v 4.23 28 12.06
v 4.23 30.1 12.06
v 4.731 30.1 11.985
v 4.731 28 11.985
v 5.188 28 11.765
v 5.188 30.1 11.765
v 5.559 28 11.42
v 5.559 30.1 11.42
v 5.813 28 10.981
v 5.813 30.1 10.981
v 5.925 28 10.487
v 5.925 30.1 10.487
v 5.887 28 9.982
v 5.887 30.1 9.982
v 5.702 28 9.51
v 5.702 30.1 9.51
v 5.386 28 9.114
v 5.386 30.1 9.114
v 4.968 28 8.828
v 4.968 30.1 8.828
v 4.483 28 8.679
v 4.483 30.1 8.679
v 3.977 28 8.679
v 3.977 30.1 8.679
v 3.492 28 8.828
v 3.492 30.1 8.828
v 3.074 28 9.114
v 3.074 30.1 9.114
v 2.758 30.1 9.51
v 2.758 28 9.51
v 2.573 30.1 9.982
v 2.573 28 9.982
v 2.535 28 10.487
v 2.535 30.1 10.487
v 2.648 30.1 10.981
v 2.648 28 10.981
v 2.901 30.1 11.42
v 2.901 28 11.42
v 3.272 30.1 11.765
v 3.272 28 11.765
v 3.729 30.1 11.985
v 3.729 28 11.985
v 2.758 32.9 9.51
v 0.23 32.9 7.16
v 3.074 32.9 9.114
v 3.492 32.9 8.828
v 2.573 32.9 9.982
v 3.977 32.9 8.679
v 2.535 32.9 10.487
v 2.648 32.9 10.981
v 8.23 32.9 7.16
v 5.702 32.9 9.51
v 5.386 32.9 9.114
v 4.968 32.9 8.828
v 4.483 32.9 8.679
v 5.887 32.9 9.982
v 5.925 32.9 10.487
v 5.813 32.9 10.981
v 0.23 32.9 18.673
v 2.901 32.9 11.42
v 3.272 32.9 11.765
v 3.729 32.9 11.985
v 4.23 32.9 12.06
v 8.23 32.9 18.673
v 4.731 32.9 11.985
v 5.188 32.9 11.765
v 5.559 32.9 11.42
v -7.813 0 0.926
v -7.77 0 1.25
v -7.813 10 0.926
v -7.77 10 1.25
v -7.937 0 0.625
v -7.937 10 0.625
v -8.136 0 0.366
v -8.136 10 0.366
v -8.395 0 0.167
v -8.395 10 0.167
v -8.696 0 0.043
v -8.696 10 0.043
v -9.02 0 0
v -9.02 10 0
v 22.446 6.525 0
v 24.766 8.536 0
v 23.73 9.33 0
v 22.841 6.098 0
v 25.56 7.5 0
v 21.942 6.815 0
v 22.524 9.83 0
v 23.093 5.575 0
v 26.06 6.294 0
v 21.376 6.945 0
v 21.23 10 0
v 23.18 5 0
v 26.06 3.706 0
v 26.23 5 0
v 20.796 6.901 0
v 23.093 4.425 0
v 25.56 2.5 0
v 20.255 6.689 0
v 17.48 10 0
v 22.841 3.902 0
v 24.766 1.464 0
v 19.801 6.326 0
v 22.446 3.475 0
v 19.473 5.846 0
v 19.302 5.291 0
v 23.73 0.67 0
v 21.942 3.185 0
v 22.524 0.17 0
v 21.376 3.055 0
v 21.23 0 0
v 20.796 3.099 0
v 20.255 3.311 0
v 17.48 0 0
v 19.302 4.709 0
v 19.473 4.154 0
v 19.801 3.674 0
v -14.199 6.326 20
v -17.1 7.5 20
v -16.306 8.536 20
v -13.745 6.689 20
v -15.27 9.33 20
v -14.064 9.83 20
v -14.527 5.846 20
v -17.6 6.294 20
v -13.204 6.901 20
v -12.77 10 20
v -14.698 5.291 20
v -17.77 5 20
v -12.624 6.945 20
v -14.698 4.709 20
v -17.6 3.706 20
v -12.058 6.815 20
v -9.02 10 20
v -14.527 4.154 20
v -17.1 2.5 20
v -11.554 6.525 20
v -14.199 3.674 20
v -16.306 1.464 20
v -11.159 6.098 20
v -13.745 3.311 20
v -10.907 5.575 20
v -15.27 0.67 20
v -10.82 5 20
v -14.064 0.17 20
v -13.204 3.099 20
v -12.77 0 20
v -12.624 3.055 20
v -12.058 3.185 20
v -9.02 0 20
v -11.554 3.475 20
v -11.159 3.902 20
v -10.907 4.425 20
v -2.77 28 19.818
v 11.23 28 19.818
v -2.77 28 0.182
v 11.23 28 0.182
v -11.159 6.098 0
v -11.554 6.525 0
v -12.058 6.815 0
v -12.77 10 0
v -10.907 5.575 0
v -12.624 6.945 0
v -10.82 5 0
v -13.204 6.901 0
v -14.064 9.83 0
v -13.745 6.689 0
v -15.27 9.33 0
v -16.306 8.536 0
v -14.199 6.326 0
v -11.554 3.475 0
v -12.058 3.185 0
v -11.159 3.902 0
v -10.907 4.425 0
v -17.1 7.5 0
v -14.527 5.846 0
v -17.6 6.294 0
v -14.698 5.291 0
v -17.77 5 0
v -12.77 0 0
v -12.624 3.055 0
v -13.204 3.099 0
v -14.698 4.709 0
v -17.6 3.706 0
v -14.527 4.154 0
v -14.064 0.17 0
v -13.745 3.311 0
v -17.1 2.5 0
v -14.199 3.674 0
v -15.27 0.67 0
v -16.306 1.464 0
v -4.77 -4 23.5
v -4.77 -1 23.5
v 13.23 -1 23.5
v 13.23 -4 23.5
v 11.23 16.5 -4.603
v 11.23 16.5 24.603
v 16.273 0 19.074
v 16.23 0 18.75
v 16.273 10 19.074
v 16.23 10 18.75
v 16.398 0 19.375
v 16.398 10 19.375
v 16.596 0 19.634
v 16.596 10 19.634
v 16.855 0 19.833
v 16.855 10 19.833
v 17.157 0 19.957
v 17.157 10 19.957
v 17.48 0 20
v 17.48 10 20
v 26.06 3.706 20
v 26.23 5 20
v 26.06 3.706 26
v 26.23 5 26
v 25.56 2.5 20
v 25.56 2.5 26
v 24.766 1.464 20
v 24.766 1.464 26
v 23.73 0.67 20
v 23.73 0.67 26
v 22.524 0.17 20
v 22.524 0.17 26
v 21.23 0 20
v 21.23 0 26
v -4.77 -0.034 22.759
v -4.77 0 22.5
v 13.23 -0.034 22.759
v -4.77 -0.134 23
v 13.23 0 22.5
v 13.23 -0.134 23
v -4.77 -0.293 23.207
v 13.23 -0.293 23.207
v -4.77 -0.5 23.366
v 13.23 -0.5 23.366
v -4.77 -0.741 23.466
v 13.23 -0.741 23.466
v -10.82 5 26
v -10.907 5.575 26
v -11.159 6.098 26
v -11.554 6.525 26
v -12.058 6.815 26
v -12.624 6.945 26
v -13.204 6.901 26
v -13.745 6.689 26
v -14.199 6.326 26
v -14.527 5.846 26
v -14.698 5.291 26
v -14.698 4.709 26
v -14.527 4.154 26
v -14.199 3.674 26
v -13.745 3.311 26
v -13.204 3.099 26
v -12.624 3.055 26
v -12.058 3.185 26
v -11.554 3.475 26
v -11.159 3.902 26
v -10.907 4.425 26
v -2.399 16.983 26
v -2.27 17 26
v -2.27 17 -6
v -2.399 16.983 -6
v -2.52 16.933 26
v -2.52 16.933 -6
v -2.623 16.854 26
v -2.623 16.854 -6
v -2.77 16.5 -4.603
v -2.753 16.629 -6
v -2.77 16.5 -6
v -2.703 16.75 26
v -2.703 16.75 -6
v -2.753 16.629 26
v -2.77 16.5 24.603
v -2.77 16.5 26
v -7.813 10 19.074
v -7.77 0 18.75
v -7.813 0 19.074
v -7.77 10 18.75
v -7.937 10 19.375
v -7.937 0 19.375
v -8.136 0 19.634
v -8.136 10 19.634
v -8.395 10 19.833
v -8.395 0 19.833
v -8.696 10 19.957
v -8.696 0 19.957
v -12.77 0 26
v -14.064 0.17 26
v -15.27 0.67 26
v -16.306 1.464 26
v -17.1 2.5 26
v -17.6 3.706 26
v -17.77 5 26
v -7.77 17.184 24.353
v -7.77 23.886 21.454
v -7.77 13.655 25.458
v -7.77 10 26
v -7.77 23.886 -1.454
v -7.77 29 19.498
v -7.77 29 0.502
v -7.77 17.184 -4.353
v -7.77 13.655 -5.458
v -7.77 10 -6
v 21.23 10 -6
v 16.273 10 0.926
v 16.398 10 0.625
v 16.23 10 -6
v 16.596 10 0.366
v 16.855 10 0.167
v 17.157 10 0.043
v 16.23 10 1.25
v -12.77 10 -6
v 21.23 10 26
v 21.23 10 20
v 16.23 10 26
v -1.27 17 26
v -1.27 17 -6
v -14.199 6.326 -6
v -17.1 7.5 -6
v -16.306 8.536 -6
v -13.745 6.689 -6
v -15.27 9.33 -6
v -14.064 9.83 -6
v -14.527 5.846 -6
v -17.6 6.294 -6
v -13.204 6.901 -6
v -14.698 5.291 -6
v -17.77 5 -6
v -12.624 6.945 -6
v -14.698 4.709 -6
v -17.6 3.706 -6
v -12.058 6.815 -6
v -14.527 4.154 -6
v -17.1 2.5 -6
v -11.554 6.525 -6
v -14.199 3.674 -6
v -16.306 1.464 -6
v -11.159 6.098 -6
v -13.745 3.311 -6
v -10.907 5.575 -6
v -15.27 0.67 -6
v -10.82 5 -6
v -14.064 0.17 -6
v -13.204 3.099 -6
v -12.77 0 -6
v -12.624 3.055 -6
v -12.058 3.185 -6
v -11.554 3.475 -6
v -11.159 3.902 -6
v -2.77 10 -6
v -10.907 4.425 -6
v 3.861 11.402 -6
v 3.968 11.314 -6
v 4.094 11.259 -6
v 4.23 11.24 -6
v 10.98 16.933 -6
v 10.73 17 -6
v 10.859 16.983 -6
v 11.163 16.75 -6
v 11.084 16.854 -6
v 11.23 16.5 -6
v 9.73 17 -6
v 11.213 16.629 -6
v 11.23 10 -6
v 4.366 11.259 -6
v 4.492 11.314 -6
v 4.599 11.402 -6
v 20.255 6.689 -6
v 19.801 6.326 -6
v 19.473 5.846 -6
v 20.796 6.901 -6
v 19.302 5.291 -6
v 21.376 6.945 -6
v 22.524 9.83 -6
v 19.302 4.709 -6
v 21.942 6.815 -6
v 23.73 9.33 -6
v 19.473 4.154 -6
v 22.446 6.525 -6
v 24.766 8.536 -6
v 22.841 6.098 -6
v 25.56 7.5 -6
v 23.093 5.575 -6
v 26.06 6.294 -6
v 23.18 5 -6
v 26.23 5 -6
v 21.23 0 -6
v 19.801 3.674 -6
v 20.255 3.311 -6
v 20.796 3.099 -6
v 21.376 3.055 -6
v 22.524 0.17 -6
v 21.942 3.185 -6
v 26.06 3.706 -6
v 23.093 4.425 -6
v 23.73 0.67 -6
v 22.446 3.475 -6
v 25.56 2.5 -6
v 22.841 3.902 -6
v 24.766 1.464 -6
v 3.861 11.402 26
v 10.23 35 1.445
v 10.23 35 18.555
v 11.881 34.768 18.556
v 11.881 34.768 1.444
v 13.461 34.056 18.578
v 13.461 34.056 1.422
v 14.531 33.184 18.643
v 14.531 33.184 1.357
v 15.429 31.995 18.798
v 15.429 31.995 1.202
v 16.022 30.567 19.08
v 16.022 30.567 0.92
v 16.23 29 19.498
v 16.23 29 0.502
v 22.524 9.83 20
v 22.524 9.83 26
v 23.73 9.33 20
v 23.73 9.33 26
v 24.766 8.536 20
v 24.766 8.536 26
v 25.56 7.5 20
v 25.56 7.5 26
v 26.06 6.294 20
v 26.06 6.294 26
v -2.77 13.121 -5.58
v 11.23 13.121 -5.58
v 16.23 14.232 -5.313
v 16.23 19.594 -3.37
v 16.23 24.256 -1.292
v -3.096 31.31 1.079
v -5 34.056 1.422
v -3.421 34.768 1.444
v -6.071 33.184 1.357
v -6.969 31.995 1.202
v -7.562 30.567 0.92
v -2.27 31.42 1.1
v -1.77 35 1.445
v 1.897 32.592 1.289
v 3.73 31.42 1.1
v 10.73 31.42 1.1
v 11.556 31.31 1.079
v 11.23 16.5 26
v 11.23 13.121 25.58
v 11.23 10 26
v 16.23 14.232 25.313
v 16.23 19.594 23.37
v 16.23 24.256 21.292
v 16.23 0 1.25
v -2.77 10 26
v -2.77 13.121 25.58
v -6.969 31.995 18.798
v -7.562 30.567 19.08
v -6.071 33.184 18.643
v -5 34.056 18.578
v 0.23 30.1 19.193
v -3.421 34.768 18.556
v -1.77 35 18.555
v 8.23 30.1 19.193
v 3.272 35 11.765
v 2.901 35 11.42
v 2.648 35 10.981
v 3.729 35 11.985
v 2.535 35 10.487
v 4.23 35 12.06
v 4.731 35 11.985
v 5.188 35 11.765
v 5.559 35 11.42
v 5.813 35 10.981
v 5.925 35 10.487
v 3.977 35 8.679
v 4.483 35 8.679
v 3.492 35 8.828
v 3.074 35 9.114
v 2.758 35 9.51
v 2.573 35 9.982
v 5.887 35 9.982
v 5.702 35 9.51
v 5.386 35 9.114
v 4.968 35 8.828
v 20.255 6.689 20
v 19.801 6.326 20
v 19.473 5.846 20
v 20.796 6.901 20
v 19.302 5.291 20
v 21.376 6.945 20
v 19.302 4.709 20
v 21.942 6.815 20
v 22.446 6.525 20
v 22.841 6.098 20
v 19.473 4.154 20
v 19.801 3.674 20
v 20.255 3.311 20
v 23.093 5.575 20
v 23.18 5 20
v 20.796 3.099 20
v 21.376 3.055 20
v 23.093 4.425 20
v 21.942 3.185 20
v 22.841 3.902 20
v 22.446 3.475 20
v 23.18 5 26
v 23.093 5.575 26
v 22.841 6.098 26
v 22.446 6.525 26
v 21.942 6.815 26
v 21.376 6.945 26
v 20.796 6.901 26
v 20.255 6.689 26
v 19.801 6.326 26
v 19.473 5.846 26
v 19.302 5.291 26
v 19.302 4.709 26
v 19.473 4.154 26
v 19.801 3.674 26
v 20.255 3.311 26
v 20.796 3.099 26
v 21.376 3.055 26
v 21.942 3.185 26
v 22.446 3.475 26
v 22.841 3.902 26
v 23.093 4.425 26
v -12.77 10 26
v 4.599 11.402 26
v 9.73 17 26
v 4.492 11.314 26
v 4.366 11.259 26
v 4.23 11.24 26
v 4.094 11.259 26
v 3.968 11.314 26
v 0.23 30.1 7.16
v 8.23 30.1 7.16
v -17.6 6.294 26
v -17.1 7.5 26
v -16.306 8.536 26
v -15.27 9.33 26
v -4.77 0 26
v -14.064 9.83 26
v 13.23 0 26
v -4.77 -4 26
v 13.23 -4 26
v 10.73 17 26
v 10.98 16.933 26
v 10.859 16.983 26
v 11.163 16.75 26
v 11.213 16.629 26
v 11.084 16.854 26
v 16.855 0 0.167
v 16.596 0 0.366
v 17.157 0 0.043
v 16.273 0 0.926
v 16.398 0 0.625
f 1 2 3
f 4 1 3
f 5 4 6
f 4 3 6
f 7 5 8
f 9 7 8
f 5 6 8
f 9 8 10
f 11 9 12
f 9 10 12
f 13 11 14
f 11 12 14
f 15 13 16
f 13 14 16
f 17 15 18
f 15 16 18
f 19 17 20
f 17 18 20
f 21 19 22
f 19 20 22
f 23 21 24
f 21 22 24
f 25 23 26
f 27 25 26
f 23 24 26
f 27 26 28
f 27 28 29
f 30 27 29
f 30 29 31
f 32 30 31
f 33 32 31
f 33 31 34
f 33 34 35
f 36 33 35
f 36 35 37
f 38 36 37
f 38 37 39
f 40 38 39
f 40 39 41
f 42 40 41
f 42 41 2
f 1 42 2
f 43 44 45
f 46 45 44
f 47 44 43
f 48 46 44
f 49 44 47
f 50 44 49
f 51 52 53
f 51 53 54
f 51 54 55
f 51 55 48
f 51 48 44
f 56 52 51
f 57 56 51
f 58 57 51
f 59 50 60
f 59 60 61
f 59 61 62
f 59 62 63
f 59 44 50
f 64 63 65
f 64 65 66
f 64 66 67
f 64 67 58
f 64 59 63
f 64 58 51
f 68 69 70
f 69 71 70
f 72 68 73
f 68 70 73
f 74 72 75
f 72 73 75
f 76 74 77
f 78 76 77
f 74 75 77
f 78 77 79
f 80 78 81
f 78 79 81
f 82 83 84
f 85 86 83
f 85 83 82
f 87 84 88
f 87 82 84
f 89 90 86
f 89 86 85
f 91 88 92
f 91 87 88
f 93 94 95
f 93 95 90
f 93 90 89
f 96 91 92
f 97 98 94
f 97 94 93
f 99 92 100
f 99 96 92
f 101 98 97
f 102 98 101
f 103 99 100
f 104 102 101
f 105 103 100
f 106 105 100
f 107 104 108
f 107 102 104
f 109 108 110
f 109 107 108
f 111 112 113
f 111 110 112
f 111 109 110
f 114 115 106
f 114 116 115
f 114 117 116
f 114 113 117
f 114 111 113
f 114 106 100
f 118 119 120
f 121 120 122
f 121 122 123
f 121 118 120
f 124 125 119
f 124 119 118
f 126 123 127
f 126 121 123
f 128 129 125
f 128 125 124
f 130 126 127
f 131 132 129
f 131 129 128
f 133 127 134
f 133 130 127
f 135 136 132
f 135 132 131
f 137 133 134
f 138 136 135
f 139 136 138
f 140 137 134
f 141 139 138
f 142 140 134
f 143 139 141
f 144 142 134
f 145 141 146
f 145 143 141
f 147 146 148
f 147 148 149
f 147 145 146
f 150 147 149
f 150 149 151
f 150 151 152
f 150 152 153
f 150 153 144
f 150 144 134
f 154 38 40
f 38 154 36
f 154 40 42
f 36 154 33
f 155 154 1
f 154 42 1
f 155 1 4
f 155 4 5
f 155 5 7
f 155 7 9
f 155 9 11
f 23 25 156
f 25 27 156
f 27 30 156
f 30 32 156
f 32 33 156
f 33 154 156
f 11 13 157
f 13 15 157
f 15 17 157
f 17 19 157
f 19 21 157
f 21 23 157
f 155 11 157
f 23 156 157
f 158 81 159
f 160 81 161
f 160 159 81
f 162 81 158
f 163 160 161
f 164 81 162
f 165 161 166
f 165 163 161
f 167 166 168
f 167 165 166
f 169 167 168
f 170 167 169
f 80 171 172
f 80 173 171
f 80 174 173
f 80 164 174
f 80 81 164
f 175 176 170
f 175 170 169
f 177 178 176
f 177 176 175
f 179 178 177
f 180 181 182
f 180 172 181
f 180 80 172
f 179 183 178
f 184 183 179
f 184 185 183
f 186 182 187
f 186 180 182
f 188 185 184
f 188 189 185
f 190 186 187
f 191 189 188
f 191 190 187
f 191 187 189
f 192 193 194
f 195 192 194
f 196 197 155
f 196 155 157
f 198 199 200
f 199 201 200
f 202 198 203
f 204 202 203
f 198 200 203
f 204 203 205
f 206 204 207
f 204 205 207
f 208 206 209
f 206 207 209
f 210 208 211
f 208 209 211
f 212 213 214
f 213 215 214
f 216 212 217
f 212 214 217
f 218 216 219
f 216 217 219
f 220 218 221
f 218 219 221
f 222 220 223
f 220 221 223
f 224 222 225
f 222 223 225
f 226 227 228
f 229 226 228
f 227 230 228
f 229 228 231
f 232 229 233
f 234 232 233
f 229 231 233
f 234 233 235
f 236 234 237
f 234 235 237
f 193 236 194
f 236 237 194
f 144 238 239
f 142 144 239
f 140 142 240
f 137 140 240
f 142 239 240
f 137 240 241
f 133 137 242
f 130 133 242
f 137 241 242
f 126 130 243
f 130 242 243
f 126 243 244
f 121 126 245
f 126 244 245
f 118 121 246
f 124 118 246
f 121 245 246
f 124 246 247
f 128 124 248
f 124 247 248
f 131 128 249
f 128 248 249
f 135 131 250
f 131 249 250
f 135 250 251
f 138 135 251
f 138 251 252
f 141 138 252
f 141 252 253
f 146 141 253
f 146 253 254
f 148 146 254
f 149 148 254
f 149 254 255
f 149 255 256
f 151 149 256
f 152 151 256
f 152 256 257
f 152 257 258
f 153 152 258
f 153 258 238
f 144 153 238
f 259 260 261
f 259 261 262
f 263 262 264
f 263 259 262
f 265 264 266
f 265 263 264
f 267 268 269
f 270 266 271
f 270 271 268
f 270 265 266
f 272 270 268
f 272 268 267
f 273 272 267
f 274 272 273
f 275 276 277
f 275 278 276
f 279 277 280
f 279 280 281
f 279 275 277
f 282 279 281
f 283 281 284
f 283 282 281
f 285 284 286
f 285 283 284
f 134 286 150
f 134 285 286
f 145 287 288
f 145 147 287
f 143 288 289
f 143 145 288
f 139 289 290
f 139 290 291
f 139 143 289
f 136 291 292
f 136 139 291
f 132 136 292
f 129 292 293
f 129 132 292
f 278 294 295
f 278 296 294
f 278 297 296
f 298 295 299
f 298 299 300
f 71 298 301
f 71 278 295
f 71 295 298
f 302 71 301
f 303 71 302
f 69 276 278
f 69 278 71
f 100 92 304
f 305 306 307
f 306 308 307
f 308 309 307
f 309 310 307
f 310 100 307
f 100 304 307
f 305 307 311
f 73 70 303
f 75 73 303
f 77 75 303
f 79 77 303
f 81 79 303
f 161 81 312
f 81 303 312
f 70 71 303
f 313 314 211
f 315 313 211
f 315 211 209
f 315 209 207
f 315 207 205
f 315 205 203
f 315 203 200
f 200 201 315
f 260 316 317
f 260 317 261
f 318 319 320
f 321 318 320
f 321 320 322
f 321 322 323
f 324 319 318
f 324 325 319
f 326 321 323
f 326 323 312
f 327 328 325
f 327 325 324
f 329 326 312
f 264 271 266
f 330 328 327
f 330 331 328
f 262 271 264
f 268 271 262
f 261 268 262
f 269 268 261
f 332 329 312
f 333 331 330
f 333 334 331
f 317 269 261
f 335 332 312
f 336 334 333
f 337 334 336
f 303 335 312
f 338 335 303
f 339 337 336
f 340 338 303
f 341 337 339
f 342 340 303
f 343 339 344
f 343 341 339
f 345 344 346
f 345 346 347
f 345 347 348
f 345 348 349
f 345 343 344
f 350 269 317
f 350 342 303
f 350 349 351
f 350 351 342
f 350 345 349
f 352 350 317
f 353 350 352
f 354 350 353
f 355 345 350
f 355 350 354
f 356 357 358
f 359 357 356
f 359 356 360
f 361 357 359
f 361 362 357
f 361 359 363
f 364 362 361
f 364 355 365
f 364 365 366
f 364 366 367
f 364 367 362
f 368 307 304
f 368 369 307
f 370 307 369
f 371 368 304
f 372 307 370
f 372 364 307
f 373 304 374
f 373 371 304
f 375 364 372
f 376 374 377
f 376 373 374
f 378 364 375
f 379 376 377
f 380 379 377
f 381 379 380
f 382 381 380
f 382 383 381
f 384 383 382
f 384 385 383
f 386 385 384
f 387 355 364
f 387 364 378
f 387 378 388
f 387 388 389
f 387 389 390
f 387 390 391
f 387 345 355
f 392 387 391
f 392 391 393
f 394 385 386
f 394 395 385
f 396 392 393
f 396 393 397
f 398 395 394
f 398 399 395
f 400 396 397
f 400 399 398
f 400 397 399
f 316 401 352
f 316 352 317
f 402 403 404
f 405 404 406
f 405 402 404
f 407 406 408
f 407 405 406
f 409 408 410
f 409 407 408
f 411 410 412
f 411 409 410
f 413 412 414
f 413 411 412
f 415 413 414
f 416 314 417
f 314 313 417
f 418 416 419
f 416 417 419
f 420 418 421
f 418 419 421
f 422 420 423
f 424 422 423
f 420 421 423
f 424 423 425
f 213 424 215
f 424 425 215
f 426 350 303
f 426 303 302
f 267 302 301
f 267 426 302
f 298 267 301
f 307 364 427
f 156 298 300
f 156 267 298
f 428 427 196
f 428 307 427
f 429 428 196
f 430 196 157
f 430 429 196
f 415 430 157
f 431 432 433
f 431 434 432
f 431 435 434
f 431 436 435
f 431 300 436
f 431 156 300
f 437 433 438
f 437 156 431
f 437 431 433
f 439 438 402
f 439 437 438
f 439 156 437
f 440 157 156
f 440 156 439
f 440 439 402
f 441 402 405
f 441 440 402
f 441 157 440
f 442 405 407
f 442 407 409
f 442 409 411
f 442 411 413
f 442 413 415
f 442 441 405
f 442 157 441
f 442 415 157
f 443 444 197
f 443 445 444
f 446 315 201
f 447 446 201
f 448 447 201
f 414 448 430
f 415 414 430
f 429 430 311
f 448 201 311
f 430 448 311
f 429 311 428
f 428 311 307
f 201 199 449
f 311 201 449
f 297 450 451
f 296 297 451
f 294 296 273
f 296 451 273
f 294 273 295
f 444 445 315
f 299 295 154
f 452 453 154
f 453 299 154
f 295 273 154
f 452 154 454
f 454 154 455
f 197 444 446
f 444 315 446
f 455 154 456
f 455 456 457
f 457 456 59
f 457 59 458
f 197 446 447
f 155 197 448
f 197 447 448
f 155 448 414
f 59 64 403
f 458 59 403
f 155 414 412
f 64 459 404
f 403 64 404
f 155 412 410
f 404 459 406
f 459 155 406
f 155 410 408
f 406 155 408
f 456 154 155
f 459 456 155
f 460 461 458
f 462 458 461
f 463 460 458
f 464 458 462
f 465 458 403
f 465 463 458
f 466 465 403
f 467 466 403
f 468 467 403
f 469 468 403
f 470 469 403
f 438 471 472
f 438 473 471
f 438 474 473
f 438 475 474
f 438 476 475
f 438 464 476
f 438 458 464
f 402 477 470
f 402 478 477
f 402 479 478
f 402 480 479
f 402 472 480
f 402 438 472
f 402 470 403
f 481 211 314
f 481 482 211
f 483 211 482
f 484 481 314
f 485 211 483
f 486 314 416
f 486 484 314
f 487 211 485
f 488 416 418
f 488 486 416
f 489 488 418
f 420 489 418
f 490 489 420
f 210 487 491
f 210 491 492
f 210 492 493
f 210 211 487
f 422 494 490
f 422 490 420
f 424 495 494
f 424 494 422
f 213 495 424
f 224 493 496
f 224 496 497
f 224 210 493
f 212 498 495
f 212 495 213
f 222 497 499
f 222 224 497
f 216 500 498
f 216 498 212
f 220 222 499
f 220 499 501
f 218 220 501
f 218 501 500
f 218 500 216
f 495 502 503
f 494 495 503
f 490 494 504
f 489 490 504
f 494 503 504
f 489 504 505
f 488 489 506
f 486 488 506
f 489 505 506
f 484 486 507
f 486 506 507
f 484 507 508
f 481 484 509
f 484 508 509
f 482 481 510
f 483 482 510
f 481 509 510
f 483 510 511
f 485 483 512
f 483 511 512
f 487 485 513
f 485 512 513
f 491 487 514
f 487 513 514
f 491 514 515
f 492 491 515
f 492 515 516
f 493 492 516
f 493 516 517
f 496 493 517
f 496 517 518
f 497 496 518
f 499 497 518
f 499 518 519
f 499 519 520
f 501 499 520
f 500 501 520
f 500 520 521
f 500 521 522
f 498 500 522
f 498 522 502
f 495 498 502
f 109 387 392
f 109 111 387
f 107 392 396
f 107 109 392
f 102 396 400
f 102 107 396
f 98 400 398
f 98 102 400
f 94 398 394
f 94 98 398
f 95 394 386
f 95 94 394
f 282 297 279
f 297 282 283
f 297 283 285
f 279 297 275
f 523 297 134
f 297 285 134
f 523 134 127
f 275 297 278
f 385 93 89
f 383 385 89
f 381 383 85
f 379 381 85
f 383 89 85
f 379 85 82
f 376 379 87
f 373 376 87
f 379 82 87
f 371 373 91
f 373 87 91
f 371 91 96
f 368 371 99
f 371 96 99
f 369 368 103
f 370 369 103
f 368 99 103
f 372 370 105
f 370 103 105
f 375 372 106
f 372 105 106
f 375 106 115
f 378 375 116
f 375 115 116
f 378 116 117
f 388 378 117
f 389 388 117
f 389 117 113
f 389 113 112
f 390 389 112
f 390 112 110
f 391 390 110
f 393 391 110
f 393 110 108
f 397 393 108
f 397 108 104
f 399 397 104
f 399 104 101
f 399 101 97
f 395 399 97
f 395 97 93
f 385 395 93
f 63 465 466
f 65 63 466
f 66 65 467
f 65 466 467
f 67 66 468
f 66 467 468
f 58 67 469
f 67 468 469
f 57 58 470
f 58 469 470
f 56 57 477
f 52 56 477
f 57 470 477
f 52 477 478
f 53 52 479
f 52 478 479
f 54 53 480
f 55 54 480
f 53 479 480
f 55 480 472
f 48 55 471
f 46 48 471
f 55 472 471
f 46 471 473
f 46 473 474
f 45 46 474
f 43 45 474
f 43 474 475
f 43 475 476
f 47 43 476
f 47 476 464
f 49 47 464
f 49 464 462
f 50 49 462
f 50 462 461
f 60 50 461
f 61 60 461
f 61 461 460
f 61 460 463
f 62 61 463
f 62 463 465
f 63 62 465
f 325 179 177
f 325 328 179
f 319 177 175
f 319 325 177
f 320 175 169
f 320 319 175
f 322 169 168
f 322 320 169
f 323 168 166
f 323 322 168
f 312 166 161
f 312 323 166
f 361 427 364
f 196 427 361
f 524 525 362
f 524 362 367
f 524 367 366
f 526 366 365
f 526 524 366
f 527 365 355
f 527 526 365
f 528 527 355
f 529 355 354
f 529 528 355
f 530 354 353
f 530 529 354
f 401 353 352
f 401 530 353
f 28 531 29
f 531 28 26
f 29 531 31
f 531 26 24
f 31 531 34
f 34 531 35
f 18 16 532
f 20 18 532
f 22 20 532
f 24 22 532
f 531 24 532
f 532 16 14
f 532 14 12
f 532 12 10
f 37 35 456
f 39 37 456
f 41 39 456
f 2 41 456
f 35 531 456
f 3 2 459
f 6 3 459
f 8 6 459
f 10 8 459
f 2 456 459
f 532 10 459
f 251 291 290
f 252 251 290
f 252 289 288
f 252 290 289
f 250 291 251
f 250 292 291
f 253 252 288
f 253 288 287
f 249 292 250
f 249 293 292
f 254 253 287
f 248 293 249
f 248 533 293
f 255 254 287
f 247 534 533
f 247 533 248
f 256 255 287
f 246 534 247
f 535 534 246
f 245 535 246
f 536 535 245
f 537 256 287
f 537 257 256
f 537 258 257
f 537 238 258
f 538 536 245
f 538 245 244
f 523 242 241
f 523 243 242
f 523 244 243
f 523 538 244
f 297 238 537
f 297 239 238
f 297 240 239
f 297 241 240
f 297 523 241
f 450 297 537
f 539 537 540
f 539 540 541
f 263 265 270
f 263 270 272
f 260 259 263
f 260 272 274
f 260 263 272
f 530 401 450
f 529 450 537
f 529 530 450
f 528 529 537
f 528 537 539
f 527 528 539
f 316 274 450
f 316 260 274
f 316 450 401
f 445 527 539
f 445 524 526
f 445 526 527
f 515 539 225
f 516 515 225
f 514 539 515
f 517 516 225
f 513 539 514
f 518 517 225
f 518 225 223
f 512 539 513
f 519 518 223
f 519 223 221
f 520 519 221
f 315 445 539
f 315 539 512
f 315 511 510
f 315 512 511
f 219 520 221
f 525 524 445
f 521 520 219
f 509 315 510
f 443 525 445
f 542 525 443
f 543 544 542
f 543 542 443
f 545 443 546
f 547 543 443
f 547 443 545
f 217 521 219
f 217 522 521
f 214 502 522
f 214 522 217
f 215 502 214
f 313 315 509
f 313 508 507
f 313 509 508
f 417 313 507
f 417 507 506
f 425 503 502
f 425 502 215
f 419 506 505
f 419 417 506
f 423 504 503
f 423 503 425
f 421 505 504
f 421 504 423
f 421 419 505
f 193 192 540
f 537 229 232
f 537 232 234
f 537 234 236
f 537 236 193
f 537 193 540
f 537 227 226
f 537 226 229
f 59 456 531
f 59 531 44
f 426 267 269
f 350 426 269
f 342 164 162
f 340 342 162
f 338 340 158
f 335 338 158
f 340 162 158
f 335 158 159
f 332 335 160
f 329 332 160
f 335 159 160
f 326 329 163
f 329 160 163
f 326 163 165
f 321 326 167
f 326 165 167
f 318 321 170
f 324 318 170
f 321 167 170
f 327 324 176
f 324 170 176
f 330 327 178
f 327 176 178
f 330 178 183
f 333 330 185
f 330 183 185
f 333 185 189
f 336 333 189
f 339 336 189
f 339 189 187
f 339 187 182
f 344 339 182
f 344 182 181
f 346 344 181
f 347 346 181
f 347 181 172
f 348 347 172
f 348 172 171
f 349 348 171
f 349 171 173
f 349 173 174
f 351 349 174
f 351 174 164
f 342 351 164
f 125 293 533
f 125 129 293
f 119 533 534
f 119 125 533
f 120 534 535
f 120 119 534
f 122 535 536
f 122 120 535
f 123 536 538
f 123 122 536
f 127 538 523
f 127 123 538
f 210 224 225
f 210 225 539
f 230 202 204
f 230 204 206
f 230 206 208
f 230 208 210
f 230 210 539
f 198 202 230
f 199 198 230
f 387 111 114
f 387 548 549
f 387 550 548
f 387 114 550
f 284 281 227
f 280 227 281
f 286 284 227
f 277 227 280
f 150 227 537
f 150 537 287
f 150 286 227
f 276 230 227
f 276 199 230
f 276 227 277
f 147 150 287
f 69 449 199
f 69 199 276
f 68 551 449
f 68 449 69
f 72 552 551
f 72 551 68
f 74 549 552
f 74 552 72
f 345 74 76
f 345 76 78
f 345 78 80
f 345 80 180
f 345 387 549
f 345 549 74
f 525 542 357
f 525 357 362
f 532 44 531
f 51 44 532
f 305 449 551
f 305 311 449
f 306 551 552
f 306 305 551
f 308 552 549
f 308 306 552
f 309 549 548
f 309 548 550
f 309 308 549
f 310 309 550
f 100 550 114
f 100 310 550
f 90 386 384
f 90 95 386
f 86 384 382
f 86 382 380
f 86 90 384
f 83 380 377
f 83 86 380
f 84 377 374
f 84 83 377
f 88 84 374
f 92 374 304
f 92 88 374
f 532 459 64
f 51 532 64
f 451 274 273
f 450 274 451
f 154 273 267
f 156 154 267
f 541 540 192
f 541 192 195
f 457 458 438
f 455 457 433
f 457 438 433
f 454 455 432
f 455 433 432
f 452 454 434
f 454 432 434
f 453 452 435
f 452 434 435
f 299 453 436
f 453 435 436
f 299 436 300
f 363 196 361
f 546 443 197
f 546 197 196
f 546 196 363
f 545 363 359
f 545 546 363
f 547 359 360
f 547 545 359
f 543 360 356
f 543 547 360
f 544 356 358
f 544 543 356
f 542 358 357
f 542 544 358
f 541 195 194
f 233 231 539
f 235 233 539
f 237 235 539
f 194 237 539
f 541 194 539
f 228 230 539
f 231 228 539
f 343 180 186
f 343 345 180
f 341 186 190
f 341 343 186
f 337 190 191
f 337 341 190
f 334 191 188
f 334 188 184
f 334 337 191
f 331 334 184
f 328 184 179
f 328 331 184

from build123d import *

# Parameters (mm, degrees)
BOSS_EXTRUDE1_DEPTH = 10
SKETCH2_W           = 5
SKETCH2_H           = 32
BOSS_EXTRUDE2_DEPTH = 18
SKETCH3_W           = 24
SKETCH3_H           = 20
BOSS_EXTRUDE3_DEPTH = 7
CUT_EXTRUDE1_DEPTH  = 56.290143787
BOSS_EXTRUDE4_REACH = 56.194
SKETCH7_R           = 1.7
CUT_EXTRUDE2_DEPTH  = 7
SKETCH6_W           = 8
SKETCH6_H           = 2.8
CUT_EXTRUDE3_DEPTH  = 13.34
SKETCH8_R           = 1.95
CUT_EXTRUDE4_DEPTH  = 55.194244669
FILLET1_R           = 5
FILLET2_R           = 1.25
FILLET3_R           = 6
SKETCH9_W           = 18
SKETCH9_H           = 2.5
BOSS_EXTRUDE5_DEPTH = 4
FILLET4_R           = 1


with BuildPart() as part:
    # Sketch1 → Boss-Extrude1 (new body)
    with BuildSketch(Plane(origin=(0, 0, 0), x_dir=(1, 0, 0), z_dir=(0, 1, 0))):
        Polygon((-17.769938204, -26), (-17.769938204, -20), (-7.769938204, -20), (-7.769938204, 0), (-17.769938204, 0), (-17.769938204, 6), (26.230061796, 6), (26.230061796, 0), (16.230061796, 0), (16.230061796, -20), (26.230061796, -20), (26.230061796, -26), align=None)
    extrude(amount=BOSS_EXTRUDE1_DEPTH)

    # Sketch2 → Boss-Extrude2 (add)
    with BuildSketch(Plane(origin=(0, 10, 0), x_dir=(1, 0, 0), z_dir=(0, 1, 0))):
        with Locations((-5.269938204, -10)):
            Rectangle(SKETCH2_W, SKETCH2_H)
        with Locations((13.730061796, -10)):
            Rectangle(SKETCH2_W, SKETCH2_H)
    extrude(amount=BOSS_EXTRUDE2_DEPTH)

    # Sketch3 → Boss-Extrude3 (add)
    with BuildSketch(Plane(origin=(0, 28, 0), x_dir=(1, 0, 0), z_dir=(0, 1, 0))):
        with Locations((4.230061796, -10)):
            Rectangle(SKETCH3_W, SKETCH3_H)
    extrude(amount=BOSS_EXTRUDE3_DEPTH)

    # Sketch4 → Cut-Extrude1 (cut, through all)
    with BuildSketch(Plane(origin=(16.230061796, 0, 0), x_dir=(0, 0, -1), z_dir=(1, 0, 0))):
        with BuildLine():
            Line((-26, 10), (-26, 35))
            Line((-26, 35), (-18.555107994, 35))
            add(Edge.make_bspline(
                [(-26, 10), (-25.555357091, 18.878891188), (-18.529592831, 25.955762579), (-18.555107994, 35)],
                knots=[0, 0, 0, 0, 1, 1, 1, 1], degree=3))
        make_face()
        with BuildLine():
            Line((6, 10), (6, 35))
            Line((6, 35), (-1.444892006, 35))
            add(Edge.make_bspline(
                [(6, 10), (5.555357091, 18.878891188), (-1.470407169, 25.955762579), (-1.444892006, 35)],
                knots=[0, 0, 0, 0, 1, 1, 1, 1], degree=3))
        make_face()
    extrude(amount=-CUT_EXTRUDE1_DEPTH, mode=Mode.SUBTRACT)

    # Boss-Extrude4: up to this face of the body (flat: up to its plane)
    boss_extrude4_end = Plane(part.part.faces().sort_by_distance((4.230061796, 5, -6))[0])
    # Sketch5 → Boss-Extrude4 (add, up to the picked face)
    with BuildSketch(Plane.XY.offset(26), mode=Mode.PRIVATE) as boss_extrude4_sk1:
        with BuildLine():
            Line((-2.769938204, 10), (11.230061796, 10))
            Line((11.230061796, 10), (11.230061796, 16.5))
            ThreePointArc((11.230061796, 16.5), (11.083615187, 16.853553391), (10.730061796, 17))
            Line((10.730061796, 17), (9.730061796, 17))
            Line((9.730061796, 17), (4.598638866, 11.402084076))
            ThreePointArc((4.598638866, 11.402084076), (4.230061796, 11.239946391), (3.861484726, 11.402084076))
            Line((3.861484726, 11.402084076), (-1.269938204, 17))
            Line((-1.269938204, 17), (-2.269938204, 17))
            ThreePointArc((-2.269938204, 17), (-2.623491594, 16.853553391), (-2.769938204, 16.5))
            Line((-2.769938204, 16.5), (-2.769938204, 10))
        make_face()
    boss_extrude4_tool1 = split(extrude(boss_extrude4_sk1.sketch, amount=-BOSS_EXTRUDE4_REACH, mode=Mode.PRIVATE), bisect_by=boss_extrude4_end, keep=Keep.BOTH, mode=Mode.PRIVATE)
    add(boss_extrude4_tool1.solids().sort_by(Axis((-2.613413, 13.25, 26), (0, 0, -1)))[0])

    # Sketch7 → Cut-Extrude2 (cut)
    with BuildSketch(Plane(origin=(0, 35, 0), x_dir=(1, 0, 0), z_dir=(0, 1, 0))):
        with Locations(Location((4.230061796, -10.360107994, 0), (0, 0, 270))):
            Circle(SKETCH7_R)
    extrude(amount=-CUT_EXTRUDE2_DEPTH, mode=Mode.SUBTRACT)

    # Sketch6 → Cut-Extrude3 (cut)
    with BuildSketch(Plane.XY.offset(20.5)):
        with Locations((4.230061796, 31.5)):
            Rectangle(SKETCH6_W, SKETCH6_H)
    extrude(amount=-CUT_EXTRUDE3_DEPTH, mode=Mode.SUBTRACT)

    # Sketch8 → Cut-Extrude4 (cut, through all)
    with BuildSketch(Plane.XY.offset(26)):
        with Locations((21.230061796, 5)):
            Circle(SKETCH8_R)
        with Locations((-12.769938204, 5)):
            Circle(SKETCH8_R)
    extrude(amount=-CUT_EXTRUDE4_DEPTH, mode=Mode.SUBTRACT)

    # Fillet1
    fillet1_edges = [part.edges().sort_by_distance(p)[0] for p in [
        (-17.769938204, 0, -3),
        (-17.769938204, 10, -3),
        (-17.769938204, 0, 23),
        (-17.769938204, 10, 23),
        (26.230061796, 10, -3),
        (26.230061796, 0, -3),
        (26.230061796, 0, 23),
        (26.230061796, 10, 23),
    ]]
    fillet(fillet1_edges, radius=FILLET1_R - 0.0001)  # a hair under: the kernel refuses the full size

    # Fillet2
    fillet2_edges = [part.edges().sort_by_distance(p)[0] for p in [
        (-7.769938204, 5, 20),
        (-7.769938204, 5, 0),
        (16.230061796, 5, 0),
        (16.230061796, 5, 20),
    ]]
    fillet(fillet2_edges, radius=FILLET2_R)

    # Fillet3
    fillet3_edges = [part.edges().sort_by_distance(p)[0] for p in [
        (16.230061796, 35, 10),
        (-7.769938204, 35, 10),
    ]]
    fillet(fillet3_edges, radius=FILLET3_R)

    # Sketch9 → Boss-Extrude5 (add)
    with BuildSketch(Plane.XZ):
        with Locations((4.230061796, 24.75)):
            Rectangle(SKETCH9_W, SKETCH9_H)
    extrude(amount=BOSS_EXTRUDE5_DEPTH)

    # Fillet4
    fillet4_edges = [part.edges().sort_by_distance(p)[0] for p in [
        (4.230061796, 0, 23.5),
    ]]
    fillet(fillet4_edges, radius=FILLET4_R)


solid = part.part
